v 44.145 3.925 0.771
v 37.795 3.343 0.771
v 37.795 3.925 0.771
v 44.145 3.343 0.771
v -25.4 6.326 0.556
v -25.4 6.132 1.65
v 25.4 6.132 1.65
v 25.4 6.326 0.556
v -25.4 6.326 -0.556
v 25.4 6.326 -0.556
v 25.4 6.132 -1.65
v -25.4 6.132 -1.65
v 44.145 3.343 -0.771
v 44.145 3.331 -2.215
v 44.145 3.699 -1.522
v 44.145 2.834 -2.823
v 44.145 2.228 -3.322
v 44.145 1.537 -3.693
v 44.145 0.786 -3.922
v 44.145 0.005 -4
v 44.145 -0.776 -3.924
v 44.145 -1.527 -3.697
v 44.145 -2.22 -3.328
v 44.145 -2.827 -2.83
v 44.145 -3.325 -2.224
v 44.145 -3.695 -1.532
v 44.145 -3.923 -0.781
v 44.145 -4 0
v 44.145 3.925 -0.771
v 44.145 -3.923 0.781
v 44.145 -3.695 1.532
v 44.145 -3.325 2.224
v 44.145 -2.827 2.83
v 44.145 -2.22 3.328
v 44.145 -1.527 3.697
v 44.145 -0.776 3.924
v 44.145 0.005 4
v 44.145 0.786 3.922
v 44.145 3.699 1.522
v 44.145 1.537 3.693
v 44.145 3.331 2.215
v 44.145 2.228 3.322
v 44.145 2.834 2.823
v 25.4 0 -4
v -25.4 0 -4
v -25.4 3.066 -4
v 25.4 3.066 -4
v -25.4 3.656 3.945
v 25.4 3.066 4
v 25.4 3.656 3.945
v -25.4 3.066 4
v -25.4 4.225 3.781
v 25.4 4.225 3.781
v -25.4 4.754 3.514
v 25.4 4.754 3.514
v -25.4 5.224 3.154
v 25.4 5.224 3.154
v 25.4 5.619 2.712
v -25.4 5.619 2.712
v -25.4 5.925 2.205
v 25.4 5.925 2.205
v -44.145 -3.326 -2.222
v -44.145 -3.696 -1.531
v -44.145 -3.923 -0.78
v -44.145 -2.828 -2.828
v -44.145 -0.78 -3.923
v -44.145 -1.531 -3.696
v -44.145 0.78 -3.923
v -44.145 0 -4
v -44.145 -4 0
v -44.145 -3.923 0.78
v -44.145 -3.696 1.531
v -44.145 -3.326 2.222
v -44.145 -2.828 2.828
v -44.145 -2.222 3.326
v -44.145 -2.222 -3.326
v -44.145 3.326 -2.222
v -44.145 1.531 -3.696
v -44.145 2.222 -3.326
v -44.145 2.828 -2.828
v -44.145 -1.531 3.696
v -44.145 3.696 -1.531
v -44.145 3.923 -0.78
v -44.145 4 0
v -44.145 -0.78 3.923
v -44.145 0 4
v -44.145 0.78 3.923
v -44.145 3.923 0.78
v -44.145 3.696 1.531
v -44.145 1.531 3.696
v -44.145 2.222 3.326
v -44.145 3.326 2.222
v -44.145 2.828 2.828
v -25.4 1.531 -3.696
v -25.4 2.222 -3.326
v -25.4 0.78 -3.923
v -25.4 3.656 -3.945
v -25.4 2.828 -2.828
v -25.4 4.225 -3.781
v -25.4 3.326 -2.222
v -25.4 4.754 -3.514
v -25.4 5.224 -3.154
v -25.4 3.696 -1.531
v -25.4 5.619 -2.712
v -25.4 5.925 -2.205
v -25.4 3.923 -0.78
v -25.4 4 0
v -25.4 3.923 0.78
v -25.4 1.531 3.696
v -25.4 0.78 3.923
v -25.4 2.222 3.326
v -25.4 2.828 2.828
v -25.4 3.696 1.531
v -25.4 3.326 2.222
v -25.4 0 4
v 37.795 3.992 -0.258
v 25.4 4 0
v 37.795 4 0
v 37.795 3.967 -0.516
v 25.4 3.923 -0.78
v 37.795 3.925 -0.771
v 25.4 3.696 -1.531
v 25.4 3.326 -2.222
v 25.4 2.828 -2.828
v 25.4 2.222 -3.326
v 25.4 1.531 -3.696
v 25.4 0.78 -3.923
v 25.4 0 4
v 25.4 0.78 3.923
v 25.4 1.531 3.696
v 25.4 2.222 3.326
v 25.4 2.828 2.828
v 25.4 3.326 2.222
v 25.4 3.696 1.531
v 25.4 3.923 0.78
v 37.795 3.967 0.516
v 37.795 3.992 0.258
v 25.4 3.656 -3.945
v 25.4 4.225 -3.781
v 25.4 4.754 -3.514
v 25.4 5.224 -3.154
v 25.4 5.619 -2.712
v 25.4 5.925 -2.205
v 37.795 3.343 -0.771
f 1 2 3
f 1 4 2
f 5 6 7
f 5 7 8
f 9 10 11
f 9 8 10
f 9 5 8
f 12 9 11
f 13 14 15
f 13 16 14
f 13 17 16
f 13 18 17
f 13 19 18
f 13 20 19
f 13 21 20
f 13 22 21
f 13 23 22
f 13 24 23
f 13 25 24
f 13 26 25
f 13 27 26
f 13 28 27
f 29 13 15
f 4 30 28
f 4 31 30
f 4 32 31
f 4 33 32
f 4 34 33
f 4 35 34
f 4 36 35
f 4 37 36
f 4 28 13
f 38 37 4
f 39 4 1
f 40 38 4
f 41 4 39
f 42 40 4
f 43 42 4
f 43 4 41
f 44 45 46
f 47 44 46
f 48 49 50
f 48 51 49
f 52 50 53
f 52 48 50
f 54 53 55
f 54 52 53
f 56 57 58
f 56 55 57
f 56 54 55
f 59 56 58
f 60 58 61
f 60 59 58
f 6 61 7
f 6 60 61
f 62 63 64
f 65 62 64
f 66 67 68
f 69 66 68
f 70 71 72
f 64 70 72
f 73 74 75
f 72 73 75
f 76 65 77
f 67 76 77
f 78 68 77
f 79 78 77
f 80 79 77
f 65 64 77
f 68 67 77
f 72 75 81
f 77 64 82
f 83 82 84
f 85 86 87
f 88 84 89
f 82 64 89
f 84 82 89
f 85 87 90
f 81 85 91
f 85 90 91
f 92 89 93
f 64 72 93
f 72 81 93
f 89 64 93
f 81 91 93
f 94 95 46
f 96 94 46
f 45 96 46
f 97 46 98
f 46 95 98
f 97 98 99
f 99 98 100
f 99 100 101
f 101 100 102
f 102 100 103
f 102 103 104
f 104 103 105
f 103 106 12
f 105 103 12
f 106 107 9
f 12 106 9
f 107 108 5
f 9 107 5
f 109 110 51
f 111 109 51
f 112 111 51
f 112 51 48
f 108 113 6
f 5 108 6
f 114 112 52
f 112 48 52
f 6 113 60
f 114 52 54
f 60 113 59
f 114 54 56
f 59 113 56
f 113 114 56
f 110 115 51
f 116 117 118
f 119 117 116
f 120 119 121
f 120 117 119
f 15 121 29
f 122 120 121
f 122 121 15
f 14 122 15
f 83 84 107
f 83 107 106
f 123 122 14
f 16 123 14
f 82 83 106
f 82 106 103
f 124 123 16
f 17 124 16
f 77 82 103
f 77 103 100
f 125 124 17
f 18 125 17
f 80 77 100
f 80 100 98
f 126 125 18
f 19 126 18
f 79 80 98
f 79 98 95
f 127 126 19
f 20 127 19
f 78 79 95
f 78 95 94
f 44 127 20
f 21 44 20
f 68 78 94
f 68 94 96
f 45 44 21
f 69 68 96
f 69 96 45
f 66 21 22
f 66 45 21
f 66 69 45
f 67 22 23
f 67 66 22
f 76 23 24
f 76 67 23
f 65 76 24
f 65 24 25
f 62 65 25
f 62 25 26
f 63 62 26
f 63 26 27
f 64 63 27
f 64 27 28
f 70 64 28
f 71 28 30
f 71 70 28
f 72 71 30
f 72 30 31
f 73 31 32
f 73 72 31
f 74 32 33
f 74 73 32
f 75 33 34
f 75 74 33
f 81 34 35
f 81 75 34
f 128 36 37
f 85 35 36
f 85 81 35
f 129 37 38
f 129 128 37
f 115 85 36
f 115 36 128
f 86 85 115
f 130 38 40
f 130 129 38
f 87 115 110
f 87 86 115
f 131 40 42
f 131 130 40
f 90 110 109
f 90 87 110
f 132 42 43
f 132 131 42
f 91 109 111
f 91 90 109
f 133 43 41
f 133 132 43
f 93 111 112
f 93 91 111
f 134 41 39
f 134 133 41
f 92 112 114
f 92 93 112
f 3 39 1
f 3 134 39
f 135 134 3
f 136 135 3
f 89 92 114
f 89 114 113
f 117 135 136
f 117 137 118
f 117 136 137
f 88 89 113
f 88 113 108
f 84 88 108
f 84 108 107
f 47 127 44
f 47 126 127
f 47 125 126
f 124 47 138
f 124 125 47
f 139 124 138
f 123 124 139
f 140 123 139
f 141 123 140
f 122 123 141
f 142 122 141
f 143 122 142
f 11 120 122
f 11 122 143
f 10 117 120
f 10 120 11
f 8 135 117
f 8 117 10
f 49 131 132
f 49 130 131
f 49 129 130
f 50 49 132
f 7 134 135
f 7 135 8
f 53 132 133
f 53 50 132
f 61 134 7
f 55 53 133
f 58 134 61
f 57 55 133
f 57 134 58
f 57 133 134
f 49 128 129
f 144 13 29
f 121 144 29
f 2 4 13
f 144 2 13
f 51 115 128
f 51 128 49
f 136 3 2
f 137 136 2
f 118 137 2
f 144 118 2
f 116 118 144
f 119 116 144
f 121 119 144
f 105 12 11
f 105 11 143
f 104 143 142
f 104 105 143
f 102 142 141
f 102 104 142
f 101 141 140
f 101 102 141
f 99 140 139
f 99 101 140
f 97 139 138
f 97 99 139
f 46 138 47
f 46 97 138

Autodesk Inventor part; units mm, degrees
ref_plane "YZ Plane" through (0, 0, 0) normal (1, 0, 0) x (0, 1, 0)
ref_plane "XZ Plane" through (0, 0, 0) normal (0, 1, 0) x (-1, 0, 0)
ref_plane "XY Plane" through (0, 0, 0) normal (0, 0, 1) x (1, 0, 0)
sketch "Sketch1" plane through (0, 0, 0) normal (1, 0, 0) x (0, 1, 0)
  circle A0 centre (0, 0) radius 4
  arc A1 (6.1319, -1.65) -> (6.1319, 1.65) centre (0, 0) ccw
  line L0 (0, 4) -> (3.0659, 4)
  line L1 (0, -4) -> (3.0659, -4)
  arc A2 (6.1319, 1.65) -> (3.0659, 4) centre (3.0659, 0.825) ccw
  arc A3 (3.0659, -4) -> (6.1319, -1.65) centre (3.0659, -0.825) ccw
  point P0 (4.9318, 4)
  point P1 (4.9318, -4)
  dimension "d0" = 8
  dimension "d1" = 12.7
  dimension "d2" = 3.175
extrude "Extrusion1" add sketch "Sketch1" along normal mid plane 88.2904 contours A0
extrude "Extrusion2" add sketch "Sketch1" along normal mid plane 50.8 contours A0 L0 A2 A1 A3 L1
sketch "Sketch2" plane through (44.1452, 0, 0) normal (1, 0, 0) x (0, 0, -1)
  circle A0 centre (0, 0) radius 4 projected
  line L0 (0, 0) -> (0, 3.3434)
  line L1 (0, 3.3434) -> (0.7706, 3.3434)
  line L2 (0.7706, 3.3434) -> (0.7706, 3.9251)
  line L3 (0, 3.3434) -> (-0.7706, 3.3434)
  line L4 (-0.7706, 3.3434) -> (-0.7706, 3.9251)
extrude "Extrusion3" cut sketch "Sketch2" against normal blind 6.35 contours L2 L1 L3 L4 A0 picked at (0.343, 3.5595)
properties part number "Cam Shaft Test"
